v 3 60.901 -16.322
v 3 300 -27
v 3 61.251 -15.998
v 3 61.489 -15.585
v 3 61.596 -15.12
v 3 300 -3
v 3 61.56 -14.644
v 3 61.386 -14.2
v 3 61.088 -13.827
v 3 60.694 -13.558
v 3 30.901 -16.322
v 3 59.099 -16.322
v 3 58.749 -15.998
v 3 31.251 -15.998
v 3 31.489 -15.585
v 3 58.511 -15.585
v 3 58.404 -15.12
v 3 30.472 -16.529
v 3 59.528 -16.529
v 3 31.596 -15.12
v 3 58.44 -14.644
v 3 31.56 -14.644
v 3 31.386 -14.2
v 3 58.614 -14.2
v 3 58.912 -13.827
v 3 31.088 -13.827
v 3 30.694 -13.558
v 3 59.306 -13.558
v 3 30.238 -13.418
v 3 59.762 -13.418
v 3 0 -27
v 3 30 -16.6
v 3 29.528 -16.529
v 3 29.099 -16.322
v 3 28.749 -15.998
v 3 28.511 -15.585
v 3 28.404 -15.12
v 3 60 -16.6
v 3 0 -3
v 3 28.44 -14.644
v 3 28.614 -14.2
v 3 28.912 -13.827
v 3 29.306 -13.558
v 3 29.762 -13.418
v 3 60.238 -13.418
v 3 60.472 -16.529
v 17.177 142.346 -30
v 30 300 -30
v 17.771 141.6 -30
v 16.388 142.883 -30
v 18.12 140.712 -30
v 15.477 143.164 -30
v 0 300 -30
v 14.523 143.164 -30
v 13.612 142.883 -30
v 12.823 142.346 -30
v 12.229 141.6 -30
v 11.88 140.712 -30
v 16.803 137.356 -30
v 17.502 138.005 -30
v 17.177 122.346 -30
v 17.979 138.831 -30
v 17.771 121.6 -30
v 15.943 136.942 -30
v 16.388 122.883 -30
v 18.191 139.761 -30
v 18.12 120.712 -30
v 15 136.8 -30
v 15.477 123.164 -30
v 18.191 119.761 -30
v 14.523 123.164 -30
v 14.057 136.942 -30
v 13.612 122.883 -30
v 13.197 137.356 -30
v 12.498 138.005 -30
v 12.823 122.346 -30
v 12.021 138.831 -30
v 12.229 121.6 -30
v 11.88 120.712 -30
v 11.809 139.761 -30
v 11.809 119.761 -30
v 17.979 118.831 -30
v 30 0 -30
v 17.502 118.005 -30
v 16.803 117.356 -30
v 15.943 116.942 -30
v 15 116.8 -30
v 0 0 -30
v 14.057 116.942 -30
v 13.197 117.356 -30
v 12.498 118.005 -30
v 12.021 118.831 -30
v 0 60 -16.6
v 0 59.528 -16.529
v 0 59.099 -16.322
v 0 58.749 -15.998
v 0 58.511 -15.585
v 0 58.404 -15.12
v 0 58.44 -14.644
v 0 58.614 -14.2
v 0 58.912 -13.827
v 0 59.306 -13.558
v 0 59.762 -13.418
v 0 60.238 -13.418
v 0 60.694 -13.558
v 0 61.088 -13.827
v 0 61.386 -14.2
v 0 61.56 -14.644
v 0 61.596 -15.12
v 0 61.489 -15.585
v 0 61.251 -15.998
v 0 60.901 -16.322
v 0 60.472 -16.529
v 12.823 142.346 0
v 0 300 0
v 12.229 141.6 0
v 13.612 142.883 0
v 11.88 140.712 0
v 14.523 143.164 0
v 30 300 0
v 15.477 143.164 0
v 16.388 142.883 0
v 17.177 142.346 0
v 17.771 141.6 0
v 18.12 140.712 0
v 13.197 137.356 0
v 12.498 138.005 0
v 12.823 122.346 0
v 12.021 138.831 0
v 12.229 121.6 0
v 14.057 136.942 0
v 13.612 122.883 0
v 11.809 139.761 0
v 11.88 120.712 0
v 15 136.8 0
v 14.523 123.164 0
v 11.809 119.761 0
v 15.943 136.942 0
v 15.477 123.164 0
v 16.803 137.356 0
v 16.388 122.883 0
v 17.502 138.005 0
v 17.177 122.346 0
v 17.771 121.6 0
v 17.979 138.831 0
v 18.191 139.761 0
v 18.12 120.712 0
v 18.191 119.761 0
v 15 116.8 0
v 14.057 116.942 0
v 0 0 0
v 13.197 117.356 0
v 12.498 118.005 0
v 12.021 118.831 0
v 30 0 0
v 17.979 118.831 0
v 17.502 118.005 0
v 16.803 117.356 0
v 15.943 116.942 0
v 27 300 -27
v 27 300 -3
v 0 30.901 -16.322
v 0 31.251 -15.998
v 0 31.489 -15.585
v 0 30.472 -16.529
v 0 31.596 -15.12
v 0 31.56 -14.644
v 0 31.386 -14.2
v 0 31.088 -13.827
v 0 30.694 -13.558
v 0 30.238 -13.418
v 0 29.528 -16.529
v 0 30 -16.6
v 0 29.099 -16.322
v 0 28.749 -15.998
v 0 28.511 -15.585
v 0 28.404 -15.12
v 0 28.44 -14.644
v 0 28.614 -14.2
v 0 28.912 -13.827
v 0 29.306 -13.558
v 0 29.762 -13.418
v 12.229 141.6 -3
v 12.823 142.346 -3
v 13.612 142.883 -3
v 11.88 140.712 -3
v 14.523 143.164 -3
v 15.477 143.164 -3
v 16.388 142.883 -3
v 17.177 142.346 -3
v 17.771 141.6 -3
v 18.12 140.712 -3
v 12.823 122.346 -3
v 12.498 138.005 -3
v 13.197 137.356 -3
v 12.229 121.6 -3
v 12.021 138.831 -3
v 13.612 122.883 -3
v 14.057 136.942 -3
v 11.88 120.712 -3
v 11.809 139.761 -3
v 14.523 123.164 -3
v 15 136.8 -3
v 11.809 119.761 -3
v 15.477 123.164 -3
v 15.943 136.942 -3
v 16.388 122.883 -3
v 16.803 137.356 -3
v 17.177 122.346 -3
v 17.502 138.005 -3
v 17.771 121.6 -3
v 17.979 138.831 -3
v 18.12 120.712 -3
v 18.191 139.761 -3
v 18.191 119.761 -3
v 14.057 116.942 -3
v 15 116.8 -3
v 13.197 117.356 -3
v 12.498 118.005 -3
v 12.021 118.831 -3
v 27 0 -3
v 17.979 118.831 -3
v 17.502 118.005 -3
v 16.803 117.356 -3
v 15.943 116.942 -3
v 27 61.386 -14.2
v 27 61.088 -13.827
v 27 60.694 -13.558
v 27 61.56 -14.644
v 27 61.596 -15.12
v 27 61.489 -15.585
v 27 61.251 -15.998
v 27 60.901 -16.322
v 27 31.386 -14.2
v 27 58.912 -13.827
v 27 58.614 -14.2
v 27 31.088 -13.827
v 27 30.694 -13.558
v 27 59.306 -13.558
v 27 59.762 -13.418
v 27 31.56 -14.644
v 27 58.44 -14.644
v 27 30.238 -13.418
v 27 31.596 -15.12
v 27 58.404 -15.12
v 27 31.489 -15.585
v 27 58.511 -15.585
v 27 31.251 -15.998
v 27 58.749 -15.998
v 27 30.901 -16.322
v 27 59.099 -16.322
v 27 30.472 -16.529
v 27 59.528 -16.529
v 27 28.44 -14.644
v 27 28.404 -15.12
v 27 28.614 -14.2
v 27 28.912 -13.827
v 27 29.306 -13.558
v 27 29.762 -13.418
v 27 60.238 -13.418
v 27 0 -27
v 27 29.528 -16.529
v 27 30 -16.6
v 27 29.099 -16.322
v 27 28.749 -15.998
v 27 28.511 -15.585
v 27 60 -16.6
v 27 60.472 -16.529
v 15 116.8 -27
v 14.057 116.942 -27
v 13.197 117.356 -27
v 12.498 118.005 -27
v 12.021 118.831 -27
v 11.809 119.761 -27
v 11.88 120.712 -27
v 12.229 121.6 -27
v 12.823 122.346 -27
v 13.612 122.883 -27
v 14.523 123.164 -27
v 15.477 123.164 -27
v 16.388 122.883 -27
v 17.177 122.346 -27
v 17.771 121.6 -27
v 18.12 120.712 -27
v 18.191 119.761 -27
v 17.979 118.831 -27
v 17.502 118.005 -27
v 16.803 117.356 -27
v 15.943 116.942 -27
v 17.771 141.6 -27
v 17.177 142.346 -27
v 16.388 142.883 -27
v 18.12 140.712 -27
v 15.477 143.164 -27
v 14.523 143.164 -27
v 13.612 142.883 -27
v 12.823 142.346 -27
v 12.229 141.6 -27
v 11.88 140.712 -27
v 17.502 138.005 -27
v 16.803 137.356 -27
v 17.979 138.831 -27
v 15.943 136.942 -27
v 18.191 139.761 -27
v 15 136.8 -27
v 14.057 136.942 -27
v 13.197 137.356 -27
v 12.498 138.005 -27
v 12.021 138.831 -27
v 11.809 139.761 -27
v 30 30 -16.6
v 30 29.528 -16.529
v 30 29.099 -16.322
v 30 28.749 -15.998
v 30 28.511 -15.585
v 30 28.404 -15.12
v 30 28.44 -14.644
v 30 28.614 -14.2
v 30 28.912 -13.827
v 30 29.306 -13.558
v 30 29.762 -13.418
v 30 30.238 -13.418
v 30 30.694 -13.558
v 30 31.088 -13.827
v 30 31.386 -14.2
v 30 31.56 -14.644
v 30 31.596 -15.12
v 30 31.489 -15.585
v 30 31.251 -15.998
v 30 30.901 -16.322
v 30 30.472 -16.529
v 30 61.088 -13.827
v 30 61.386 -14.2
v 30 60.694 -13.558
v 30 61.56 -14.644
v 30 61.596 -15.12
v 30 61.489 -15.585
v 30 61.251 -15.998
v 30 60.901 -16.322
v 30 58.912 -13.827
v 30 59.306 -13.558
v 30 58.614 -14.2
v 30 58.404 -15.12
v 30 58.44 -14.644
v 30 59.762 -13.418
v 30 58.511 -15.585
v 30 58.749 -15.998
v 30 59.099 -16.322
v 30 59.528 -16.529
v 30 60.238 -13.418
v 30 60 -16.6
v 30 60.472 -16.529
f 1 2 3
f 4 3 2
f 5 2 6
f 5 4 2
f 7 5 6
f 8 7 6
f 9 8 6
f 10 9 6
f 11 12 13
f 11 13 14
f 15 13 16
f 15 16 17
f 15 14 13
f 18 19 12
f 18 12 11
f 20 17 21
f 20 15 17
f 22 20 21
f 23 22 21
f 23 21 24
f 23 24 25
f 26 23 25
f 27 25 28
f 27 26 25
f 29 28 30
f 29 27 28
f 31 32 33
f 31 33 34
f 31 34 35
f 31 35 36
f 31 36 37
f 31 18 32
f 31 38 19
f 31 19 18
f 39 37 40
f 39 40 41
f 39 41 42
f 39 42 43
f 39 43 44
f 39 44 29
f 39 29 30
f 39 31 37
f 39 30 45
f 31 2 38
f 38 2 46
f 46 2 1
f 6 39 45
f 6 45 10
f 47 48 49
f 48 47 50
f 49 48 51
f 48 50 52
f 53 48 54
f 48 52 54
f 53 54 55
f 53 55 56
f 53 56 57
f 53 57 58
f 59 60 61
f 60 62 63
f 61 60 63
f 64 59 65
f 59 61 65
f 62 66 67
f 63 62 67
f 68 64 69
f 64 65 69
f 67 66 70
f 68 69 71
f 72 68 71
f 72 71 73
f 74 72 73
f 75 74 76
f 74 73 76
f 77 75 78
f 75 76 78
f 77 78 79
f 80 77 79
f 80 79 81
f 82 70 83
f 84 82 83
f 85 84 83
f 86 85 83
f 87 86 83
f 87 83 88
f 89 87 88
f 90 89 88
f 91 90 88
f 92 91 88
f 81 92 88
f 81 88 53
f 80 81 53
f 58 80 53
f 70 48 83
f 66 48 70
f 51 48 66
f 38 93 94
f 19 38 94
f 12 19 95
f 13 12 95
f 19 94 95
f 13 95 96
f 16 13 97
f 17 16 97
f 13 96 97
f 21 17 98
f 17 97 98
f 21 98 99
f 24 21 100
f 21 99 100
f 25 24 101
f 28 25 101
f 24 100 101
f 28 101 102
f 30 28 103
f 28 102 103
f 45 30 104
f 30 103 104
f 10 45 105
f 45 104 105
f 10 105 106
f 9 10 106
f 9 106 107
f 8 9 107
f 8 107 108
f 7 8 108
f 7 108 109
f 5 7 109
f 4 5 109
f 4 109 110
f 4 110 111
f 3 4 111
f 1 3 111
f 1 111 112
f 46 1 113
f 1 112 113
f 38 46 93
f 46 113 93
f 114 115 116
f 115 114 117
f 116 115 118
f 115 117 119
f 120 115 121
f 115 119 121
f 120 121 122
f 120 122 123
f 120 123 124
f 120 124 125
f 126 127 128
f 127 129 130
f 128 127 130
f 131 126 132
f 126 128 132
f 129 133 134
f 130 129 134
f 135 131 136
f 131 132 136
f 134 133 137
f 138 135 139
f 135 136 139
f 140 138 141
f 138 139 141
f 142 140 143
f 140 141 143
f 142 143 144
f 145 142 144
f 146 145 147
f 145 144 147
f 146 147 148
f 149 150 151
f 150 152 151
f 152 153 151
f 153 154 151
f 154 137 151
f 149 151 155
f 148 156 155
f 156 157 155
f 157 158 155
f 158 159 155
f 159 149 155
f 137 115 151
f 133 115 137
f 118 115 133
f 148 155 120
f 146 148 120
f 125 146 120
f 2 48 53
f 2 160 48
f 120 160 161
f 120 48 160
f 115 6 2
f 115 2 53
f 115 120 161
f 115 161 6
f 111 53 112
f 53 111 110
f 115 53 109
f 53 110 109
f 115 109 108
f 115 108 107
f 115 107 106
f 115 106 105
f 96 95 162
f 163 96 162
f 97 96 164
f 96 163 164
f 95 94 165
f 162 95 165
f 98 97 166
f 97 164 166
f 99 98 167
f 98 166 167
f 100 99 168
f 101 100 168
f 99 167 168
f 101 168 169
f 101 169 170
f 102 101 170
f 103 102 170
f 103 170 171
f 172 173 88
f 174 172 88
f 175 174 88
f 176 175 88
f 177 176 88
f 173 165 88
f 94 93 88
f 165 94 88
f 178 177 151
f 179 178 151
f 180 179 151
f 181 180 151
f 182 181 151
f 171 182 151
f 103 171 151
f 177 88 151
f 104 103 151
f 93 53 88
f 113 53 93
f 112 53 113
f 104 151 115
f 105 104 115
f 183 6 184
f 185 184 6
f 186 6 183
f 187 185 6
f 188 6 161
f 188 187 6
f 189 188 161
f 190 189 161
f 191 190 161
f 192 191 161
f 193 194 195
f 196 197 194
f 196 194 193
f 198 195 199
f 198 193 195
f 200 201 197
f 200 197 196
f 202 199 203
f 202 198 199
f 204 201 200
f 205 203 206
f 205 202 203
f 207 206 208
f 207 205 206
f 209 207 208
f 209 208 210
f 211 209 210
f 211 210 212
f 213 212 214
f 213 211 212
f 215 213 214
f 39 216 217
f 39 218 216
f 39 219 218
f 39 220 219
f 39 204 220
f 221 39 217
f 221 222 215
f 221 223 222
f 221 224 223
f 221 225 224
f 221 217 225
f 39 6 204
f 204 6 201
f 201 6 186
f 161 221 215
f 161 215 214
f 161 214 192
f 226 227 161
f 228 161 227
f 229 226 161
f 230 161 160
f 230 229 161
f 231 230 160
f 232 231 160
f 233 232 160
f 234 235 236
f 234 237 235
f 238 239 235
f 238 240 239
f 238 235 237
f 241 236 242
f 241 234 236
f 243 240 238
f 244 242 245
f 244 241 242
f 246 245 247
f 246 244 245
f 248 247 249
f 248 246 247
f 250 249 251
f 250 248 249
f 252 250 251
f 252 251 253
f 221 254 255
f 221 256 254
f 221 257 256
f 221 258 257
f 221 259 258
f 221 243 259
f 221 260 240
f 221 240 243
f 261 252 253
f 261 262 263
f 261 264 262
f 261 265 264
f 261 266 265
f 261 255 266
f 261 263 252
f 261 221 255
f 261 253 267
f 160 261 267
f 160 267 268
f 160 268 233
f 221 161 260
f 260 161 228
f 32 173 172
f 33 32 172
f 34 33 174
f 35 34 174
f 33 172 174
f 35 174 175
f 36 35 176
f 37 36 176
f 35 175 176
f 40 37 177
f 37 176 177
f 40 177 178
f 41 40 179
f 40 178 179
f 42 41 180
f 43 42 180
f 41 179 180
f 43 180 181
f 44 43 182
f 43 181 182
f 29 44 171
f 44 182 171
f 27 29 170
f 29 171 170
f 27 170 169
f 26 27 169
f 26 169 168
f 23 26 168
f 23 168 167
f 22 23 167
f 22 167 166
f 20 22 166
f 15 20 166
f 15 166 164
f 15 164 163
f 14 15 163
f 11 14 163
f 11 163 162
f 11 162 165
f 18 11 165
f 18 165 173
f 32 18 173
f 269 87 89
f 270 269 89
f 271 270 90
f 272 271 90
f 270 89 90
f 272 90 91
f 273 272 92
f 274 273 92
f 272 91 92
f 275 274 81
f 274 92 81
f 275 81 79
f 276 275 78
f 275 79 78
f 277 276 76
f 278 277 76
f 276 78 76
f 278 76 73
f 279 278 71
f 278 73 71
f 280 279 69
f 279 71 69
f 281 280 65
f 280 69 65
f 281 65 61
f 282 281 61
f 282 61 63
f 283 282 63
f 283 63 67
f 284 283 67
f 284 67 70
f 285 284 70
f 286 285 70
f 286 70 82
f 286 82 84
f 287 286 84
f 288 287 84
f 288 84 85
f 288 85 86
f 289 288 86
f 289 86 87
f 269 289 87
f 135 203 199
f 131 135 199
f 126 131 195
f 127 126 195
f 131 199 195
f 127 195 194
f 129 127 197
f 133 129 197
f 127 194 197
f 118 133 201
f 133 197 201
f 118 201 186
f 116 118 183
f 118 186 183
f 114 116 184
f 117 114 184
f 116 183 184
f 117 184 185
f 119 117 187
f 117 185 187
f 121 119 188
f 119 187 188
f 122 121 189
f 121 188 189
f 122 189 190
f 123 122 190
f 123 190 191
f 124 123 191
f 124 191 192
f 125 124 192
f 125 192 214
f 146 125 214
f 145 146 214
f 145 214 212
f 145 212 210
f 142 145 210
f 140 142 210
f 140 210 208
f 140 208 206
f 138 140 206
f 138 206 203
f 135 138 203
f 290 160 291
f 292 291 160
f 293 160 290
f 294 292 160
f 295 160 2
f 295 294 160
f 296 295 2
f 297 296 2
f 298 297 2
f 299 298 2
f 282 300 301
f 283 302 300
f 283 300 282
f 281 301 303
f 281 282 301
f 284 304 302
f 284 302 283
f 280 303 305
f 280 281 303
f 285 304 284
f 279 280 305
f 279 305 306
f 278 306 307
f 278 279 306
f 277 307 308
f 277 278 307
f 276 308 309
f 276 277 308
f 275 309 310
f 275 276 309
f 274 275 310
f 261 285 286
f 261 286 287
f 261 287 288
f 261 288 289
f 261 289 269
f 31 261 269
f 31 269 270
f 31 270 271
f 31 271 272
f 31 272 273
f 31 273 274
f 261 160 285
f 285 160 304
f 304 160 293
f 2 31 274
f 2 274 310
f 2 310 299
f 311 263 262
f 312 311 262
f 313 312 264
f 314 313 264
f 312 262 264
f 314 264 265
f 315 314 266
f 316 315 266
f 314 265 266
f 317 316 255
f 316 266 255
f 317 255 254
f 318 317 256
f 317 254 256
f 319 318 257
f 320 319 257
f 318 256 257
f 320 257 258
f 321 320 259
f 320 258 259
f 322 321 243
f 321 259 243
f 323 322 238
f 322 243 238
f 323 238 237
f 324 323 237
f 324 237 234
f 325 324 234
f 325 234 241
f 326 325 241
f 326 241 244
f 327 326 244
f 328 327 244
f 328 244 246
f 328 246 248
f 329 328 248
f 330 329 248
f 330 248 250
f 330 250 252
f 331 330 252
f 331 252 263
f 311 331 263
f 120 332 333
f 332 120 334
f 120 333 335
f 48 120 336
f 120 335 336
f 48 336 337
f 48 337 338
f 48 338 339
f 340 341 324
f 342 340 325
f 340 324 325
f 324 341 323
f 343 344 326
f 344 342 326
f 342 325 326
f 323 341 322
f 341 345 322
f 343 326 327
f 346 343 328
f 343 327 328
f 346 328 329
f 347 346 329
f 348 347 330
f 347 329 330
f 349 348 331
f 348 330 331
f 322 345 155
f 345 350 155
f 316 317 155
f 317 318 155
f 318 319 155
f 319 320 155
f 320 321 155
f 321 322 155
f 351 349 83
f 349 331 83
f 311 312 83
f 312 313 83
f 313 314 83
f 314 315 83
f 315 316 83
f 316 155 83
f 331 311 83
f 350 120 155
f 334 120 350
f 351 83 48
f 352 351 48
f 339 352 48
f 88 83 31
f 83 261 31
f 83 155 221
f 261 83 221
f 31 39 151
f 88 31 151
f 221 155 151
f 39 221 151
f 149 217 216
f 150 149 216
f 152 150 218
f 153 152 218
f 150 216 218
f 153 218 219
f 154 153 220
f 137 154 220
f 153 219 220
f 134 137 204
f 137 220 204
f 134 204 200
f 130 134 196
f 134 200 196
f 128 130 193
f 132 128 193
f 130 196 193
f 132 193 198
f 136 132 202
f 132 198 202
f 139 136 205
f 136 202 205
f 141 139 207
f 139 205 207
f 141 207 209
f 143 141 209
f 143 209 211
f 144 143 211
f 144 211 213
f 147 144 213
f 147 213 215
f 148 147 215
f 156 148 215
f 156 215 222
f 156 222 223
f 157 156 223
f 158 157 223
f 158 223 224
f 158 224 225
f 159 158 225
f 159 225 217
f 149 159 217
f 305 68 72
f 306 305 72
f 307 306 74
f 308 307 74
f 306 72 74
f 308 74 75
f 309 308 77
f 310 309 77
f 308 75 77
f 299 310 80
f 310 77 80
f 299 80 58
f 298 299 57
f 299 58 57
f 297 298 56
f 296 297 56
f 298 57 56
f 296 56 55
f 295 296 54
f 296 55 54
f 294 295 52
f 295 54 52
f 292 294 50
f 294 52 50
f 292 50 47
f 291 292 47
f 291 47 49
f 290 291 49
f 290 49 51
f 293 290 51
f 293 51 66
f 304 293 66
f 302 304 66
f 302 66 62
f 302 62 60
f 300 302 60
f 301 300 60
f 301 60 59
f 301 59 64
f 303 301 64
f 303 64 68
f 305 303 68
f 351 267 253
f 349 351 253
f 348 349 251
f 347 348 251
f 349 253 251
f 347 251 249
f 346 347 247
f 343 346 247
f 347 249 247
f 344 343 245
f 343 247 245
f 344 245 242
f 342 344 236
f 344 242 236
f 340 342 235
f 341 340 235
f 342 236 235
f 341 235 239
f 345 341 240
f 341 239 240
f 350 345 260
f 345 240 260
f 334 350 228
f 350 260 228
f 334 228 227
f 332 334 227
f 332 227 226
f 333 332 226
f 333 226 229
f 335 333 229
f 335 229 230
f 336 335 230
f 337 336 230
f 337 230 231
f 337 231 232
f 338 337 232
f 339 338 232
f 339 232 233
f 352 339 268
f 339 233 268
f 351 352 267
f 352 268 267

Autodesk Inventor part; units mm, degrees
ref_plane "YZ Plane" through (0, 0, 0) normal (1, 0, 0) x (0, 1, 0)
ref_plane "XZ Plane" through (0, 0, 0) normal (0, 1, 0) x (-1, 0, 0)
ref_plane "XY Plane" through (0, 0, 0) normal (0, 0, 1) x (1, 0, 0)
sketch "スケッチ1" plane through (0, 0, 0) normal (0, 1, 0) x (-1, 0, 0)
  line L0 (0, 0) -> (-30, 0)
  line L1 (-30, 0) -> (-30, -30)
  line L2 (-30, -30) -> (0, -30)
  line L3 (0, -30) -> (0, 0)
  line L4 (-3, -3) -> (-27, -3)
  line L5 (-27, -3) -> (-27, -27)
  line L6 (-27, -27) -> (-3, -27)
  line L7 (-3, -27) -> (-3, -3)
  dimension "d0" = 30
  dimension "d1" = 30
  dimension "d2" = 24
  dimension "d3" = 24
  dimension "d4" = 3
  dimension "d5" = 3
extrude "押し出し1" add sketch "スケッチ1" along normal blind 300
sketch "スケッチ2" plane through (0, 0, 0) normal (0, 0, 1) x (1, 0, 0)
  point P0 (0, 0)
  point P1 (13.8561, 31.5859)
sketch "スケッチ3" plane through (30, 0, 0) normal (1, 0, 0) x (0, 0, -1)
  line L0 (30, 0) -> (30, 300) projected
  line L1 (0, 0) -> (30, 0) projected
  point P0 (15, 60)
  point P1 (15, 30)
  point P2 (15, 0)
  dimension "d11" = 30
  dimension "d12" = 30
hole "穴1" at (30, 30, -15) at (30, 60, -15) direction (-1, 0, 0) diameter 3.2 end through all
sketch "スケッチ4" plane through (0, 0, 0) normal (0, 0, 1) x (1, 0, 0)
  line L0 (30, 0) -> (0, 0) construction
  line L1 (15, 0) -> (15, 300) construction
  line L2 (30, 300) -> (0, 300) construction
  point P0 (15, 120)
  point P1 (15, 140)
  dimension "d20" = 120
  dimension "d21" = 20
hole "穴2" at (15, 120, 0) at (15, 140, 0) direction (0, 0, -1) diameter 6.4 end through all
properties part number "base" material "アルミニウム 6061"
